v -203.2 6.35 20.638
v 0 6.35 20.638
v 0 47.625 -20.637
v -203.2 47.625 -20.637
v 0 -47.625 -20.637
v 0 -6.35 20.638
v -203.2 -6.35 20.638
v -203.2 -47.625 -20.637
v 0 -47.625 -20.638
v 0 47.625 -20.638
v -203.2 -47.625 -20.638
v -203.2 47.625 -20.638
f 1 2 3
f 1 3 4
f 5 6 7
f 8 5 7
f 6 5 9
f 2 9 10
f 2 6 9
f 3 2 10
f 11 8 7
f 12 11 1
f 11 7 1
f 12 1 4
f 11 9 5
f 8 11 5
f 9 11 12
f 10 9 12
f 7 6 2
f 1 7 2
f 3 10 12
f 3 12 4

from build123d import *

# Parameters (mm, degrees)
F0_W     = 95.25
F0_H     = 41.275
F1_DEPTH = 203.2
F2_SIZE  = 41.27499


# Not quite as in the source:
# - a fillet or chamfer is up to 0.001 mm smaller than in the source, because OpenCascade refuses the exact size


with BuildPart() as f1:
    # F0 (on Right) → F1 (new body)
    with BuildSketch(Plane.YZ):
        Rectangle(F0_W, F0_H)
    extrude(amount=-F1_DEPTH)

    # F2 (size 41.275 in the source; OpenCascade refuses exactly that, so slightly less here)
    f2_edges = [f1.edges().sort_by_distance(p)[0] for p in [
        (-101.6, -47.625, 20.6375),
        (-101.6, 47.625, 20.6375),
    ]]
    chamfer(f2_edges, length=F2_SIZE)


solid = f1.part
